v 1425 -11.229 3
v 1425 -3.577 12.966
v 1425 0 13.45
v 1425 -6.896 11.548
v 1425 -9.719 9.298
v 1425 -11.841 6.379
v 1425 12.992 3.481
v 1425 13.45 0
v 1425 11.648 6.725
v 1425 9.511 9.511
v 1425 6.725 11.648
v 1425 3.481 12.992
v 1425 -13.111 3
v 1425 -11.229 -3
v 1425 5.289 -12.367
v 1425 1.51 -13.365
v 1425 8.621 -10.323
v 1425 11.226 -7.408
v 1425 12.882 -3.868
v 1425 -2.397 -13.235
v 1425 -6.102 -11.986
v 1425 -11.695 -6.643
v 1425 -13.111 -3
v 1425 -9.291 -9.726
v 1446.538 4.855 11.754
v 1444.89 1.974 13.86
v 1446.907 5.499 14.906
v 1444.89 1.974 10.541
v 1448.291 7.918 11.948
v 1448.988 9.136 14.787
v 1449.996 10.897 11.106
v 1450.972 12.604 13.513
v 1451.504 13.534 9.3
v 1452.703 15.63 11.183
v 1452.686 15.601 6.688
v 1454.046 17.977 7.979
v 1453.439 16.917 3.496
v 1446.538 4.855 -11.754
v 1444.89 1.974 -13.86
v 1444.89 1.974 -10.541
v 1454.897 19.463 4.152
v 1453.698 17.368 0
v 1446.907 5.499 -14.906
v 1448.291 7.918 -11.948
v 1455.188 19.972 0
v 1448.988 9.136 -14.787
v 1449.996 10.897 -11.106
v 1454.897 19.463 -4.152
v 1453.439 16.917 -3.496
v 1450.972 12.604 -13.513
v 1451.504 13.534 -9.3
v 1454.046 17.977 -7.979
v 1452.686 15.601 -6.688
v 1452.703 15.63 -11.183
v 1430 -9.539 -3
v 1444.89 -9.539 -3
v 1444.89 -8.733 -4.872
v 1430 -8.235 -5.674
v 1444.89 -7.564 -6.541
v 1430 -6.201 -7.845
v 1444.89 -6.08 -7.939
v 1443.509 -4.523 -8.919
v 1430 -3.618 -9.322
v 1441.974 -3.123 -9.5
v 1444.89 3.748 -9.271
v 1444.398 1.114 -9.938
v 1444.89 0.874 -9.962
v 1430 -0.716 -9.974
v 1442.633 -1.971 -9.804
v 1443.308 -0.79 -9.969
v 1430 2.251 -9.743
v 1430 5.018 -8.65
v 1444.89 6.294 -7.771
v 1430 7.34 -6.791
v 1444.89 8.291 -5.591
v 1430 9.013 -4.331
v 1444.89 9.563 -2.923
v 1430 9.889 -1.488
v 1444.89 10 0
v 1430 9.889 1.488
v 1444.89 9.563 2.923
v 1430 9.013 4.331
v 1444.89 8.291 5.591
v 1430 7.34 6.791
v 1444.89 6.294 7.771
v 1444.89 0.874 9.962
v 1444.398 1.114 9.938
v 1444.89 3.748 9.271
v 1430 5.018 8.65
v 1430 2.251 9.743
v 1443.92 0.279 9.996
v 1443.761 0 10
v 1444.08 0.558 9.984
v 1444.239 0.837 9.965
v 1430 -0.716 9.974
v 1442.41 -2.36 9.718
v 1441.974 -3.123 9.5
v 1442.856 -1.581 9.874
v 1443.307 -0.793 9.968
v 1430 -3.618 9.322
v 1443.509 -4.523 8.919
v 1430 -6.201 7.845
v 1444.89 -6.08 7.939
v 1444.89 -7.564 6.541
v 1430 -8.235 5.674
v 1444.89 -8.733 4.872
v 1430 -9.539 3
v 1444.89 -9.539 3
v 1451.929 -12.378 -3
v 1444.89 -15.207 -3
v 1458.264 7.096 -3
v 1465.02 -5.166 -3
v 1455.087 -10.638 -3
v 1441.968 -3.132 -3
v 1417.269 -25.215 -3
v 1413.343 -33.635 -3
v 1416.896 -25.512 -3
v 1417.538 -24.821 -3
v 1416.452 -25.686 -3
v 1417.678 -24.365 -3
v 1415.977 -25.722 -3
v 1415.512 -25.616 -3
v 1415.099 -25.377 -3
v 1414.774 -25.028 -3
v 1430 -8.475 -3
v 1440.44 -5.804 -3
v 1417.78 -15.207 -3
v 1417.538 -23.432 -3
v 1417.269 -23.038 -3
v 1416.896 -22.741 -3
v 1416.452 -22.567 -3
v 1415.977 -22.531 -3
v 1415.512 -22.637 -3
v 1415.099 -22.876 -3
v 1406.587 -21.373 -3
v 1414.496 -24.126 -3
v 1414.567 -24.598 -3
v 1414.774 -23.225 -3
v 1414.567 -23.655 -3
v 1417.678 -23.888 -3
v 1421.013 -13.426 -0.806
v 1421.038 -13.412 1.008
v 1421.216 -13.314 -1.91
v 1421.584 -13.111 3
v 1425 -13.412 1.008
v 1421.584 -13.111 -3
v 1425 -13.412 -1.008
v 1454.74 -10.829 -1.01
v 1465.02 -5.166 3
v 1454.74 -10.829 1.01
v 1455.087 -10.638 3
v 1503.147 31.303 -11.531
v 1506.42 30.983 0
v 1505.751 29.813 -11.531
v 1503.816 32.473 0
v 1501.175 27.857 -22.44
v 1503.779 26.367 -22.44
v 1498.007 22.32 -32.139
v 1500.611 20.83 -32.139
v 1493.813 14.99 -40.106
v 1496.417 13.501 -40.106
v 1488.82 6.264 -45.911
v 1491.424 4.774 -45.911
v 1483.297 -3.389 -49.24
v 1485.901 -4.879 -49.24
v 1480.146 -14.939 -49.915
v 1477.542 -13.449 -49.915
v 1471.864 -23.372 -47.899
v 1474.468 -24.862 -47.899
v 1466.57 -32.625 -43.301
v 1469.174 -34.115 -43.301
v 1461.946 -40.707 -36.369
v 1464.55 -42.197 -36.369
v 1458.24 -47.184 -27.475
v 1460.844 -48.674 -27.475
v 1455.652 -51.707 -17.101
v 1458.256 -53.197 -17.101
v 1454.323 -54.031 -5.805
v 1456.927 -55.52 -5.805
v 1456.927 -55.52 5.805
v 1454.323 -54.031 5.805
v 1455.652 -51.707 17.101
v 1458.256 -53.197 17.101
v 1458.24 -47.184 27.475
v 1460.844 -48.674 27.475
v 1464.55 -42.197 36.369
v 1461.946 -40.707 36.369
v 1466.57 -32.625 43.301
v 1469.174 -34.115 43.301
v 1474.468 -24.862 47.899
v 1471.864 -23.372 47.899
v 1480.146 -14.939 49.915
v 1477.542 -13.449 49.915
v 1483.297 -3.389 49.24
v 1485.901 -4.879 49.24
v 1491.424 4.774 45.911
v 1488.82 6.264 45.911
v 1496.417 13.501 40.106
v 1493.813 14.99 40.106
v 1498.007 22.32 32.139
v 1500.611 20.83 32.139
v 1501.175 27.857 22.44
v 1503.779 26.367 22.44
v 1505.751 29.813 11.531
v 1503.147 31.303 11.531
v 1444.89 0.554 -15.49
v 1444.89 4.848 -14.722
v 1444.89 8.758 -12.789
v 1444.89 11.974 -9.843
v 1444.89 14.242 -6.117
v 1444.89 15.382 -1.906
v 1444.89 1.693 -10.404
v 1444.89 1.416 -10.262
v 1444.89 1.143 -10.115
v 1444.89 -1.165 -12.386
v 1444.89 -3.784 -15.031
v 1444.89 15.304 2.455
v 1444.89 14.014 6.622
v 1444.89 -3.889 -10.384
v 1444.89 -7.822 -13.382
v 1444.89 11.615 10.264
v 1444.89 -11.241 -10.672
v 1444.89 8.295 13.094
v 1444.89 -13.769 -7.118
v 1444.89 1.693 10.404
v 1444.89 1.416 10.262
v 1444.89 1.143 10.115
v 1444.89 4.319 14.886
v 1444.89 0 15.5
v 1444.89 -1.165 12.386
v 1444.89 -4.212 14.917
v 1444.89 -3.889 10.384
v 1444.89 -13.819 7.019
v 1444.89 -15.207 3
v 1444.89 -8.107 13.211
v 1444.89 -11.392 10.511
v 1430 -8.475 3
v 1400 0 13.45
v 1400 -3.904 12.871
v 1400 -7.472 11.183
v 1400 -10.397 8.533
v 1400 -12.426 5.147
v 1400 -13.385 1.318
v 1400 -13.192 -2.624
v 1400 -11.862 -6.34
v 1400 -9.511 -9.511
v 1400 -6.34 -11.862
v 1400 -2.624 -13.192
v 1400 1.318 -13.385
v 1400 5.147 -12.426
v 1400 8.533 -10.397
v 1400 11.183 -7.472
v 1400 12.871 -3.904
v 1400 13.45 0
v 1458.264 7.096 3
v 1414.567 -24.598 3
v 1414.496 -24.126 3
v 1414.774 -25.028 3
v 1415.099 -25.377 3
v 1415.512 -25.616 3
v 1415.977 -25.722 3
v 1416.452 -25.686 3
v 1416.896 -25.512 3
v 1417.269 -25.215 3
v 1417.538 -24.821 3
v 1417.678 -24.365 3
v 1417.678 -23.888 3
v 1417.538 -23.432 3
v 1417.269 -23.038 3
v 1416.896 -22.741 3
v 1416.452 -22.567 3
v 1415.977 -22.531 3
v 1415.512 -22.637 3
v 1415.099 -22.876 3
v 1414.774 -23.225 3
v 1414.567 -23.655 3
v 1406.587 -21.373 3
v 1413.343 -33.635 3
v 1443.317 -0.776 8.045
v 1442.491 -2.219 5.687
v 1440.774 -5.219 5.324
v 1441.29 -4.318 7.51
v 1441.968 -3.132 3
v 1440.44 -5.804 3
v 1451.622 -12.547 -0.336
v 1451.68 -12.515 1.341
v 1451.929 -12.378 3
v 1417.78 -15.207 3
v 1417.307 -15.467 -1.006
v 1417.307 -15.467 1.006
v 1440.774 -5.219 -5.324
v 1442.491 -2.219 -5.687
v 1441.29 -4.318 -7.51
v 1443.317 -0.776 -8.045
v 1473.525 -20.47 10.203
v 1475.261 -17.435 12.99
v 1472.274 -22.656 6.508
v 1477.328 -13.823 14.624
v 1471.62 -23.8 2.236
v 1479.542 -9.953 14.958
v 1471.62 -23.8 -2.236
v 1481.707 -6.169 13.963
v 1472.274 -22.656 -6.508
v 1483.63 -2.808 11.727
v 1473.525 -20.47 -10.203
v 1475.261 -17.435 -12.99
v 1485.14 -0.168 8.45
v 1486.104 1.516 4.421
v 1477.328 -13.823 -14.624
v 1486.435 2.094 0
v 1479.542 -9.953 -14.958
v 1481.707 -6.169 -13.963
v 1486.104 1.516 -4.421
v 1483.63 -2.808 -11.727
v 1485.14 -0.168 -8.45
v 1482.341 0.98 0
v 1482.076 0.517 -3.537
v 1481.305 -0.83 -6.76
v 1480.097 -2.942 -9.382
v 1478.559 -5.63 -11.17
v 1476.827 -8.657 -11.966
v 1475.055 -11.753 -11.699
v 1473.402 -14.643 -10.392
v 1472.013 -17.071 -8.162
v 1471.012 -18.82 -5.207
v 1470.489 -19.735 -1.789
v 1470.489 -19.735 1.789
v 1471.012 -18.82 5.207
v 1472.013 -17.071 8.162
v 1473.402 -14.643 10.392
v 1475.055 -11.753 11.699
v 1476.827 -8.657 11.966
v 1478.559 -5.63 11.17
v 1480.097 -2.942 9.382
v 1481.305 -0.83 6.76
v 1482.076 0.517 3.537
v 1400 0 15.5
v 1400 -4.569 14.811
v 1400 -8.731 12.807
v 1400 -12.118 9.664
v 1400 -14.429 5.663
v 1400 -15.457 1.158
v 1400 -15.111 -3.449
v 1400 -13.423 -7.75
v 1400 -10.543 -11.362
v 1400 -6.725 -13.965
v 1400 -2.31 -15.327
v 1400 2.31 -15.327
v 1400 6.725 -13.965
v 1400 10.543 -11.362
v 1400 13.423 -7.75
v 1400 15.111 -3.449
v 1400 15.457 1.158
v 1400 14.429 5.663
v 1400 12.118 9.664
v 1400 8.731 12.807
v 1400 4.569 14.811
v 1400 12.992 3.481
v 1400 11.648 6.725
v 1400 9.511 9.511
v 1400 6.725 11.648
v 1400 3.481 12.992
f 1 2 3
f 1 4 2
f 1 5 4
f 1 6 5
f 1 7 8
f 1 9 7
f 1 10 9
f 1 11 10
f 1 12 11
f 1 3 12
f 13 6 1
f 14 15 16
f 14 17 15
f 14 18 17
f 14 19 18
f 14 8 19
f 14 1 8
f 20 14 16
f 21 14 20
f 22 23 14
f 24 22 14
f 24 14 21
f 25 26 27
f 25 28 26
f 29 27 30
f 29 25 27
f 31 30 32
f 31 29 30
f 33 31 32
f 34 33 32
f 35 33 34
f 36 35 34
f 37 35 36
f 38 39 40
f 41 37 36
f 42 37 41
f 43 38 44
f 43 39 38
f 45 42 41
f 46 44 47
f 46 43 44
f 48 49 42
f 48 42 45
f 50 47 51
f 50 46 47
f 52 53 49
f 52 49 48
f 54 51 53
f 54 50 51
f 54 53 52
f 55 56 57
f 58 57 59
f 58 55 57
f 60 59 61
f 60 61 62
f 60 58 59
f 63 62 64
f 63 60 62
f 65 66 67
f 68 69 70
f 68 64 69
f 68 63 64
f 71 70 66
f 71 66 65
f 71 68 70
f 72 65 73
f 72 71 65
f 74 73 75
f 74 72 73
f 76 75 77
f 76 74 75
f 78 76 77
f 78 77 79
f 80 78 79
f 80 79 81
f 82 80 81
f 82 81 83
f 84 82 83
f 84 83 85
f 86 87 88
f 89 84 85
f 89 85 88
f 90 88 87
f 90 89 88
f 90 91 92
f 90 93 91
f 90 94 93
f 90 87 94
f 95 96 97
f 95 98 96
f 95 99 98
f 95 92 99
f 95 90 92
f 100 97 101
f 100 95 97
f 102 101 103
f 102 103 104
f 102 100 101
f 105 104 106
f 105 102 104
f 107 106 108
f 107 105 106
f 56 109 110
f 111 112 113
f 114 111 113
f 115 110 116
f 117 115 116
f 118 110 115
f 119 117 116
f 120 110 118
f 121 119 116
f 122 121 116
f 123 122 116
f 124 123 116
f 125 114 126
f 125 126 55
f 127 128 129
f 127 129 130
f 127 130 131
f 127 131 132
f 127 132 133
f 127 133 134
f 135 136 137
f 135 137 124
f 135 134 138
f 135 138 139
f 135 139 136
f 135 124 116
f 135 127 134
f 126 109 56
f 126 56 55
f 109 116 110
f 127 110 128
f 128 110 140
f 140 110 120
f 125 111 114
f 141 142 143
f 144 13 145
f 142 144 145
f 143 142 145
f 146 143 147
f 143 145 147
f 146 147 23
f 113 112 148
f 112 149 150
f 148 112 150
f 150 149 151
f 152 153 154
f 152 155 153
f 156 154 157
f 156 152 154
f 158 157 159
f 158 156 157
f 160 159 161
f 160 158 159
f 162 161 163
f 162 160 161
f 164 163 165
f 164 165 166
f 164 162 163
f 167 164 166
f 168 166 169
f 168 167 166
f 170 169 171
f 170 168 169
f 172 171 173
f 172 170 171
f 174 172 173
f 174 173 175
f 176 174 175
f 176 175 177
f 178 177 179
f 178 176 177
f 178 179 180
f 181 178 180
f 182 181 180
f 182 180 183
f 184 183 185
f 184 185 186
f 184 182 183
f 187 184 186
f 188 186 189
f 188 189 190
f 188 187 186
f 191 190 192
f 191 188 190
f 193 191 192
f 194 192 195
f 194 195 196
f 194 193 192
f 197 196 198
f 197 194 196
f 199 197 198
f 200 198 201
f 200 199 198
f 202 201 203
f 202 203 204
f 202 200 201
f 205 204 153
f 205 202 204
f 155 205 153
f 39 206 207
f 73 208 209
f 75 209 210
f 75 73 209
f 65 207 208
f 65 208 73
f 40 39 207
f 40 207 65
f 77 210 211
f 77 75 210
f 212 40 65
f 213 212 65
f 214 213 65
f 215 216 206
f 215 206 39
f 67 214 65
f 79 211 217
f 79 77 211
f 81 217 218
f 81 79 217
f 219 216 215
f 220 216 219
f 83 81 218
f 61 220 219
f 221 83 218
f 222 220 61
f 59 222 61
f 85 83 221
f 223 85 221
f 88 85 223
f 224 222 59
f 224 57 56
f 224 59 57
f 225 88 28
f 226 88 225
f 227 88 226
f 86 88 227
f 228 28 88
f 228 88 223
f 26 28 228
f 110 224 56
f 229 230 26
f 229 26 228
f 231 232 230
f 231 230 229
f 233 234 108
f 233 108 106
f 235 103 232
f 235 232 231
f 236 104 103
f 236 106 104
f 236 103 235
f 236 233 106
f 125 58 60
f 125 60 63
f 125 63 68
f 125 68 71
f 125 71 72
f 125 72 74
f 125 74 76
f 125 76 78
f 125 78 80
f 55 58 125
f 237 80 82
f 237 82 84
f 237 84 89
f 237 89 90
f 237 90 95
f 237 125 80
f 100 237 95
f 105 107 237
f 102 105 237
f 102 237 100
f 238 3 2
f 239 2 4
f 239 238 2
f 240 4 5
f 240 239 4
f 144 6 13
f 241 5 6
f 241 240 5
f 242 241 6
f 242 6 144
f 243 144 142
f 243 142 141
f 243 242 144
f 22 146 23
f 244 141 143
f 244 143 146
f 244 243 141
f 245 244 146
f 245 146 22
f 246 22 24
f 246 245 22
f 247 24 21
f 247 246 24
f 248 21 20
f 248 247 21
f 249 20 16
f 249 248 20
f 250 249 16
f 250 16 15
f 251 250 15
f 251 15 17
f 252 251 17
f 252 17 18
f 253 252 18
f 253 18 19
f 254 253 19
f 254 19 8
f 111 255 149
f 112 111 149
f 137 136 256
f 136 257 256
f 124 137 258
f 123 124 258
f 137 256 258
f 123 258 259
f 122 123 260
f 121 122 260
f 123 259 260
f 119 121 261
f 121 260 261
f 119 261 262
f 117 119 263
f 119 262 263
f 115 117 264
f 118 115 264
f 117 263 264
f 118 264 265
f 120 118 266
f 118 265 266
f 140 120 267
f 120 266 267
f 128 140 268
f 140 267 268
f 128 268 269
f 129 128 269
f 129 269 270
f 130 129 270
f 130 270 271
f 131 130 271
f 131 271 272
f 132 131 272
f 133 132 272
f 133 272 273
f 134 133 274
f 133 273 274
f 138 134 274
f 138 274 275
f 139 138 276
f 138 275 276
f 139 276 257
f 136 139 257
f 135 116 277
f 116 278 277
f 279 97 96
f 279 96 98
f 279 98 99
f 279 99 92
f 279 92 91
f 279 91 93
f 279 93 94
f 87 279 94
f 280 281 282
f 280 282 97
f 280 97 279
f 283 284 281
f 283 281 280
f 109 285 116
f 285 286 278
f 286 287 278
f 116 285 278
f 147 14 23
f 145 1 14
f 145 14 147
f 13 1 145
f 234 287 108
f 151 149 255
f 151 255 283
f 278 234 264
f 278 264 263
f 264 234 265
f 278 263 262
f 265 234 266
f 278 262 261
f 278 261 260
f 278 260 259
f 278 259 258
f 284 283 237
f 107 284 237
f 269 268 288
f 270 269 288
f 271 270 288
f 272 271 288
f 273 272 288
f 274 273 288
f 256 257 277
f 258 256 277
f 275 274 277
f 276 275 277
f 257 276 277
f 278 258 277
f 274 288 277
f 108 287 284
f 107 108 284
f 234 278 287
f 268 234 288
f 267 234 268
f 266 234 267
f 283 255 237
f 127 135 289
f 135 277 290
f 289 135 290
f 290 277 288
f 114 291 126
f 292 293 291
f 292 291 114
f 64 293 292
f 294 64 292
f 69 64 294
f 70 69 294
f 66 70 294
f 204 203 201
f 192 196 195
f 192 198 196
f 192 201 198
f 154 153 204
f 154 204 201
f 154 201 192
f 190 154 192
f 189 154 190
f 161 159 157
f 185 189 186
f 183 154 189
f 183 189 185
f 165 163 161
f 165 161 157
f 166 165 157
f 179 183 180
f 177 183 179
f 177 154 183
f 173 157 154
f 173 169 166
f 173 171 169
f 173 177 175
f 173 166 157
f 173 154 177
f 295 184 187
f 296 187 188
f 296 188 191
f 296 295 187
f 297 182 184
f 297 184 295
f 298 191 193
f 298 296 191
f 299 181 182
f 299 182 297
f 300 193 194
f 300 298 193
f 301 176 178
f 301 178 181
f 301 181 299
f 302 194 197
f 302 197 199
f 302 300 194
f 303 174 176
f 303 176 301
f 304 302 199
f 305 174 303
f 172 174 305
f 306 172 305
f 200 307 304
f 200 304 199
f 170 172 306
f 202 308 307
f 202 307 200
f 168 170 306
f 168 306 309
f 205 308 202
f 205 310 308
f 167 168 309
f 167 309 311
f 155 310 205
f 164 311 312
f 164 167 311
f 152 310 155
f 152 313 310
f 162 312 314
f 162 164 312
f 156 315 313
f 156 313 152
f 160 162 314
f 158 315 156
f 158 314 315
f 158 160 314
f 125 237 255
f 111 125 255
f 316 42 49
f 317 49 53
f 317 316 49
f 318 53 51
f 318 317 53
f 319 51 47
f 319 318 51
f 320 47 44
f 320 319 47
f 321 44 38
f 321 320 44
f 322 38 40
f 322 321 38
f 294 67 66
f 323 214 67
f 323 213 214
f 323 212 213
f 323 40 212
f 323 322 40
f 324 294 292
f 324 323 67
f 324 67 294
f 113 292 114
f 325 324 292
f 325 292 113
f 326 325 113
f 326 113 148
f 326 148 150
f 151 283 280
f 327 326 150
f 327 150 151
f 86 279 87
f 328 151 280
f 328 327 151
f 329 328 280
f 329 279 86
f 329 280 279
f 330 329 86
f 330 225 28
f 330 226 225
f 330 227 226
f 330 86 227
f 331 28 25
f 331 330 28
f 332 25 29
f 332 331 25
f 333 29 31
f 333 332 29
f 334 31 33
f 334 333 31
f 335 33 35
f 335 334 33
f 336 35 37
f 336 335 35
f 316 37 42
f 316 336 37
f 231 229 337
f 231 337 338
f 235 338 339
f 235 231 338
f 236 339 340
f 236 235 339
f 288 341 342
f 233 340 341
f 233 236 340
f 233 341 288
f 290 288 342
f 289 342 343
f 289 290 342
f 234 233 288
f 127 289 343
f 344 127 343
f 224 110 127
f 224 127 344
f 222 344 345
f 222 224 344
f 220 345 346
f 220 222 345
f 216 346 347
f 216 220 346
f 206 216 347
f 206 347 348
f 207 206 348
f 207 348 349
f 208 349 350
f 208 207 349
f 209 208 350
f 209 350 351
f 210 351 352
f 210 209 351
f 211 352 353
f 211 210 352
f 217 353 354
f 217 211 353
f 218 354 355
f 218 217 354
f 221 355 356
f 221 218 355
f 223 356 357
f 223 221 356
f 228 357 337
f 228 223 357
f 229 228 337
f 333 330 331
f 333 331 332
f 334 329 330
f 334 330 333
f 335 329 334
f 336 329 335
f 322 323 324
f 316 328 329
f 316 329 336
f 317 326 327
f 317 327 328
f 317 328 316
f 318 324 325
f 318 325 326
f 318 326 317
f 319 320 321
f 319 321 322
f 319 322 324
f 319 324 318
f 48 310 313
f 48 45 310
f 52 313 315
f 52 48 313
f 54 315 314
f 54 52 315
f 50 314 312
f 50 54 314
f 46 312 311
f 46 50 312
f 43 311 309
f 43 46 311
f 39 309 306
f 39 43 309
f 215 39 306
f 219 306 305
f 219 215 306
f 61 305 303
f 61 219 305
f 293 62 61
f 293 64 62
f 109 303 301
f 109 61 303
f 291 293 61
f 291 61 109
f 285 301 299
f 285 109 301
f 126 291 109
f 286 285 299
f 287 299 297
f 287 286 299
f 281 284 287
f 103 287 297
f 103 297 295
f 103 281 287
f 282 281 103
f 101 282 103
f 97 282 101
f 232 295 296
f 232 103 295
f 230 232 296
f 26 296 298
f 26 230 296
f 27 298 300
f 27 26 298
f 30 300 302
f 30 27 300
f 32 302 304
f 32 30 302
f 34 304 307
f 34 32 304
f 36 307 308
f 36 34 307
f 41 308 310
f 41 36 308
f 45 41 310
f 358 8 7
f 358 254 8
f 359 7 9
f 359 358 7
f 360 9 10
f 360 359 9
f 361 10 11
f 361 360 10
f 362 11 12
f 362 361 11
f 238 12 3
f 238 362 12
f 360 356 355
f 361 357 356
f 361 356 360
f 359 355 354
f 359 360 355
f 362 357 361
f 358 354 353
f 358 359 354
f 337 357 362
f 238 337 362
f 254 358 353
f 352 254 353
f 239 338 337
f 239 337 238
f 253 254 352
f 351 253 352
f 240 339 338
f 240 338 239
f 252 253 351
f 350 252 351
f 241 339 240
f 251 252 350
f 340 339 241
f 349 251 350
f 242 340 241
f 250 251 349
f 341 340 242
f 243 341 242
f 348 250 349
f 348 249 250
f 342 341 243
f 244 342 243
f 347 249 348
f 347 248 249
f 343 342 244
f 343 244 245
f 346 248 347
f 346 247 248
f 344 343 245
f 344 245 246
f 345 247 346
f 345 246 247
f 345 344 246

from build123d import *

# Parameters (mm, degrees)
TAB_DEPTH               = 3
CABLE_PIN_HOLE_SKETCH_R = 1.6
CABLE_PIN_HOLE_DEPTH    = 6
BORE_CLEAR_SKETCH_W     = 26
BORE_CLEAR_SKETCH_H     = 13.45


with BuildPart() as part:
    # Pad And Pedestal Sketch → Pad And Pedestal (revolve)
    with BuildSketch(Plane.XY):
        Polygon((1481.589408105, -12.415318093), (1506.420044292, 30.983293711), (1503.816127584, 32.473131883), (1486.434682253, 2.094103619), (1455.187681754, 19.972161674), (1453.697843582, 17.368244965), (1482.340927374, 0.980025082), (1476.381574689, -9.435641751), align=None)
    revolve(axis=Axis((1511.968436369, -29.796763424, 0), (-0.8679722360942783, 0.4966127237289622, 0)))

    # Socket Sketch → Socket (revolve)
    with BuildSketch(Plane.XY):
        Polygon((1400, 13.45), (1400, 15.5), (1444.890102203, 15.5), (1444.890102203, 10), (1430, 10), (1430, 0), (1425, 0), (1425, 13.45), align=None)
    revolve(axis=Axis((-3000, 0, 0), (1, 0, 0)))

    # Tab Sketch → Tab (add, symmetric)
    with BuildSketch(Plane.XY):
        Polygon((1465.019568481, -5.166098693), (1413.342666954, -33.635342599), (1406.587253146, -21.373026982), (1458.264154673, 7.096216924), align=None)
    extrude(amount=TAB_DEPTH, both=True)

    # Cable Pin Hole Sketch → Cable Pin Hole (cut, symmetric)
    with BuildSketch(Plane.XY):
        with Locations((1416.096117858, -24.126477887)):
            Circle(CABLE_PIN_HOLE_SKETCH_R)
    extrude(amount=CABLE_PIN_HOLE_DEPTH, both=True, mode=Mode.SUBTRACT)

    # Bore Clear Sketch → Bore Clear (revolve, cut)
    with BuildSketch(Plane.XY):
        with Locations((1412, 6.725)):
            Rectangle(BORE_CLEAR_SKETCH_W, BORE_CLEAR_SKETCH_H)
    revolve(axis=Axis((-3000, 0, 0), (1, 0, 0)), mode=Mode.SUBTRACT)


solid = part.part
